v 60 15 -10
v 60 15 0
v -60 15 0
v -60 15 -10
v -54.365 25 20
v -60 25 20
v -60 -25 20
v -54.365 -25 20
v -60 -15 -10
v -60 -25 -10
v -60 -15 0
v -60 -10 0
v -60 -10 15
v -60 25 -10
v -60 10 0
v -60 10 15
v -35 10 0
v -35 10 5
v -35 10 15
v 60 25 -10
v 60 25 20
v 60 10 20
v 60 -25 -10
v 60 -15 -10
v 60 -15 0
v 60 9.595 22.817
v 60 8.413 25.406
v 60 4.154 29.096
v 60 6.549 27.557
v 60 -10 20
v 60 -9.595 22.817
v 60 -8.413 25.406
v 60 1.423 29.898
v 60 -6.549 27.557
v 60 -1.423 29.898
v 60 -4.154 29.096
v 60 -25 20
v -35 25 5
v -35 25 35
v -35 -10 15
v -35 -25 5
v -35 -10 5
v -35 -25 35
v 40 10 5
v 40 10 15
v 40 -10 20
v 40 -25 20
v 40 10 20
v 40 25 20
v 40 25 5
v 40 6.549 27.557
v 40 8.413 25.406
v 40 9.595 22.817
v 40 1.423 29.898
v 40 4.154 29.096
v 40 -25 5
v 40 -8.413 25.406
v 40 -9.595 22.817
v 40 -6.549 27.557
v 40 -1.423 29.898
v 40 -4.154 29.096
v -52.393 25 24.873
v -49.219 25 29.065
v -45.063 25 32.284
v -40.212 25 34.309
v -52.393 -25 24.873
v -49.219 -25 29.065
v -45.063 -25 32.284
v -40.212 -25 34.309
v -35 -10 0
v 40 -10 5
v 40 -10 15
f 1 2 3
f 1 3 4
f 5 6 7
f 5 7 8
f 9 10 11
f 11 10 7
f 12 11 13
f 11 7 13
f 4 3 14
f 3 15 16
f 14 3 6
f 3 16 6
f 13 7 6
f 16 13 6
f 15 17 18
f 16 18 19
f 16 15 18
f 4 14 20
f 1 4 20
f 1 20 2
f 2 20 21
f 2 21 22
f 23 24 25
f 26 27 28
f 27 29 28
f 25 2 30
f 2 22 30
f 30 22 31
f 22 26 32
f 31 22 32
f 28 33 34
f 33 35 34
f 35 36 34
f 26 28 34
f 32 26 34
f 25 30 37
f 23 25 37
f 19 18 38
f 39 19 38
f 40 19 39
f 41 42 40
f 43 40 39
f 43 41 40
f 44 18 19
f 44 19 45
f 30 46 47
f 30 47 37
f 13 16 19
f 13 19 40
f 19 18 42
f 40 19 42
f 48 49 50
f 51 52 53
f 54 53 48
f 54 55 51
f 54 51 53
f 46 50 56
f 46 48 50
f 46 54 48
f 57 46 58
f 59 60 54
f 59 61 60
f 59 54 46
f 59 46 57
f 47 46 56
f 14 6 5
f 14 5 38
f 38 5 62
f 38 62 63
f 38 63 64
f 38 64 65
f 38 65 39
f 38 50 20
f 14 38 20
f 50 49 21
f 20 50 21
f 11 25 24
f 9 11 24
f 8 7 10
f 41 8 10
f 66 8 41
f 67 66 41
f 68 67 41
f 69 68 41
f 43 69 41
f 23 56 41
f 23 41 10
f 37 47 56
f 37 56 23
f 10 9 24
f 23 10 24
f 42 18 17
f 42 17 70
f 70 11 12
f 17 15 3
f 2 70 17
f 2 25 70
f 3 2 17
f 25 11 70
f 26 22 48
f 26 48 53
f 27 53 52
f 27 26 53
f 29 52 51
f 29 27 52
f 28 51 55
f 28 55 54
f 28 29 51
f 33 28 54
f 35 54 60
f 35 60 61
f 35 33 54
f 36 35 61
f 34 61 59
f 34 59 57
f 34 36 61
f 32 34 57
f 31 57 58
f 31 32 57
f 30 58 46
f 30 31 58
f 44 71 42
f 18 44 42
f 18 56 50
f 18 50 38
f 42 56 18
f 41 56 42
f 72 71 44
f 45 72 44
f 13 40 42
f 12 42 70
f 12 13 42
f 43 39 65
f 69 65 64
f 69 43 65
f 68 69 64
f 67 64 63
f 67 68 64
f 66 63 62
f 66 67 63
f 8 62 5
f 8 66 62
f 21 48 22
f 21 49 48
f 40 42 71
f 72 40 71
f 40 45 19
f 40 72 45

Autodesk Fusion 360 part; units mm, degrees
sketch "Sketch1" plane through (0, 0, 0) normal (0, 0, 1) x (1, 0, 0) in component "block"
  line L0 (60, -25) -> (-60, -25)
  line L1 (-60, -25) -> (-60, 25)
  line L2 (-60, 25) -> (60, 25)
  line L3 (60, 25) -> (60, -25)
  line L4 (60, -25) -> (-60, 25) construction
  line L5 (-60, -25) -> (60, 25) construction
  dimension "d1" = 120
  dimension "d2" = 50
extrude "Extrude1" add sketch "Sketch1" against normal blind 10 makes body 1 in component "block"
move_face "OffsetFaces1" offset 20 1 faces at (20, -8.3333, 0) on bodies 1 in component "block"
sketch "Sketch2" plane through (60, 0, 0) normal (1, 0, 0) x (0, 1, 0) in component "block"
  line L0 (25, 20) -> (-25, 20)
  line L1 (-25, 20) -> (-25, -10)
  line L2 (-25, -10) -> (25, -10)
  line L3 (25, -10) -> (25, 20)
  line L4 (-15, 0) -> (-15, -10)
  line L5 (15, 0) -> (15, -10)
  line L6 (-15, 0) -> (15, 0)
  line L7 (15, -10) -> (-15, -10)
extrude "Extrude2" cut sketch "Sketch2" against normal blind 120 contours L2 L4 L5 L6 L7 bodies 1 in component "block"
sketch "Sketch3" plane through (0, 25, 0) normal (0, 1, 0) x (-1, 0, 0) in component "block"
  line L0 (60, 20) -> (-60, 20)
  line L1 (-60, 20) -> (-60, -10)
  line L2 (-60, -10) -> (60, -10)
  line L3 (60, -10) -> (60, 20)
  line L4 (-60, 5) -> (60, 5) construction
sketch "Sketch4" plane through (0, 0, 20) normal (0, 0, 1) x (-1, 0, 0) in component "block"
  line L0 (-60, -25) -> (60, -25)
  line L1 (60, -25) -> (60, 25)
  line L2 (60, 25) -> (-60, 25)
  line L3 (-60, 25) -> (-60, -25)
  line L4 (35, -25) -> (35, 25)
  line L5 (-40, -25) -> (-40, 25)
sketch "Sketch5" plane through (-60, 0, 0) normal (-1, 0, 0) x (0, -1, 0) in component "block"
  line L0 (15, 0) -> (15, -10)
  line L1 (15, -10) -> (25, -10)
  line L2 (25, -10) -> (25, 20)
  line L3 (25, 20) -> (-25, 20)
  line L4 (-25, 20) -> (-25, -10)
  line L5 (-25, -10) -> (-15, -10)
  line L6 (-15, -10) -> (-15, 0)
  line L7 (-15, 0) -> (15, 0)
  line L8 (-10, 0) -> (-10, 15)
  line L9 (-10, 15) -> (10, 15)
  line L10 (10, 15) -> (10, 0)
extrude "Extrude3" cut sketch "Sketch5" against normal blind 25 contours L7 L8 L9 L10 bodies 1 in component "block"
sketch "Sketch6" plane through (0, -25, 0) normal (0, -1, 0) x (1, 0, 0) in component "block"
  line L0 (60, 20) -> (-60, 20)
  line L1 (-60, 20) -> (-60, -10)
  line L2 (-60, -10) -> (60, -10)
  line L3 (60, -10) -> (60, 20)
  line L4 (-60, 5) -> (-35, 5)
  line L5 (-35, 5) -> (-35, 20)
  circle A0 centre (-35, 15) radius 20
  line L6 (-35, 20) -> (-35, 35)
extrude "Extrude4" cut sketch "Sketch4" against normal blind 15 contours L0 L2 L4 L5 bodies 1 in component "block"
sketch "Sketch7" plane through (0, 0, 5) normal (0, 0, 1) x (-1, 0, 0) in component "block"
  line L0 (35, 10) -> (35, 25)
  line L1 (35, 25) -> (-40, 25)
  line L2 (-40, 25) -> (-40, -25)
  line L3 (-40, -25) -> (35, -25)
  line L4 (35, -25) -> (35, -10)
  line L5 (35, -10) -> (35, 10)
  line L6 (35, -10) -> (-40, -10)
  line L7 (35, 10) -> (-40, 10)
extrude "Extrude5" add sketch "Sketch7" along normal blind 10 separate body contours L2 L5 L6 L7 makes body 2 in component "block"
extrude "Extrude6" add sketch "Sketch6" against normal blind 50 contours L0 A0 L6 picked at (-35.9729, 29.9286) bodies 1 in component "block"
sketch "Sketch8" plane through (60, 0, 0) normal (1, 0, 0) x (0, 1, 0) in component "block"
  line L0 (-15, -10) -> (-15, 0)
  line L1 (-15, 0) -> (15, 0)
  line L2 (15, 0) -> (15, -10)
  line L3 (15, -10) -> (25, -10)
  line L4 (25, -10) -> (25, 20)
  line L5 (25, 20) -> (-25, 20)
  line L6 (-25, 20) -> (-25, -10)
  line L7 (-25, -10) -> (-15, -10)
  circle A0 centre (0, 20) radius 10
extrude "Extrude7" add sketch "Sketch8" against normal blind 20 contours L5 A0 picked at (2.0783, 22.6061) bodies 1 in component "block"
component "block" placed x (1, 0, 0) y (0, 1, 0) z (0, 0, 1) at (0, 0, 0)
